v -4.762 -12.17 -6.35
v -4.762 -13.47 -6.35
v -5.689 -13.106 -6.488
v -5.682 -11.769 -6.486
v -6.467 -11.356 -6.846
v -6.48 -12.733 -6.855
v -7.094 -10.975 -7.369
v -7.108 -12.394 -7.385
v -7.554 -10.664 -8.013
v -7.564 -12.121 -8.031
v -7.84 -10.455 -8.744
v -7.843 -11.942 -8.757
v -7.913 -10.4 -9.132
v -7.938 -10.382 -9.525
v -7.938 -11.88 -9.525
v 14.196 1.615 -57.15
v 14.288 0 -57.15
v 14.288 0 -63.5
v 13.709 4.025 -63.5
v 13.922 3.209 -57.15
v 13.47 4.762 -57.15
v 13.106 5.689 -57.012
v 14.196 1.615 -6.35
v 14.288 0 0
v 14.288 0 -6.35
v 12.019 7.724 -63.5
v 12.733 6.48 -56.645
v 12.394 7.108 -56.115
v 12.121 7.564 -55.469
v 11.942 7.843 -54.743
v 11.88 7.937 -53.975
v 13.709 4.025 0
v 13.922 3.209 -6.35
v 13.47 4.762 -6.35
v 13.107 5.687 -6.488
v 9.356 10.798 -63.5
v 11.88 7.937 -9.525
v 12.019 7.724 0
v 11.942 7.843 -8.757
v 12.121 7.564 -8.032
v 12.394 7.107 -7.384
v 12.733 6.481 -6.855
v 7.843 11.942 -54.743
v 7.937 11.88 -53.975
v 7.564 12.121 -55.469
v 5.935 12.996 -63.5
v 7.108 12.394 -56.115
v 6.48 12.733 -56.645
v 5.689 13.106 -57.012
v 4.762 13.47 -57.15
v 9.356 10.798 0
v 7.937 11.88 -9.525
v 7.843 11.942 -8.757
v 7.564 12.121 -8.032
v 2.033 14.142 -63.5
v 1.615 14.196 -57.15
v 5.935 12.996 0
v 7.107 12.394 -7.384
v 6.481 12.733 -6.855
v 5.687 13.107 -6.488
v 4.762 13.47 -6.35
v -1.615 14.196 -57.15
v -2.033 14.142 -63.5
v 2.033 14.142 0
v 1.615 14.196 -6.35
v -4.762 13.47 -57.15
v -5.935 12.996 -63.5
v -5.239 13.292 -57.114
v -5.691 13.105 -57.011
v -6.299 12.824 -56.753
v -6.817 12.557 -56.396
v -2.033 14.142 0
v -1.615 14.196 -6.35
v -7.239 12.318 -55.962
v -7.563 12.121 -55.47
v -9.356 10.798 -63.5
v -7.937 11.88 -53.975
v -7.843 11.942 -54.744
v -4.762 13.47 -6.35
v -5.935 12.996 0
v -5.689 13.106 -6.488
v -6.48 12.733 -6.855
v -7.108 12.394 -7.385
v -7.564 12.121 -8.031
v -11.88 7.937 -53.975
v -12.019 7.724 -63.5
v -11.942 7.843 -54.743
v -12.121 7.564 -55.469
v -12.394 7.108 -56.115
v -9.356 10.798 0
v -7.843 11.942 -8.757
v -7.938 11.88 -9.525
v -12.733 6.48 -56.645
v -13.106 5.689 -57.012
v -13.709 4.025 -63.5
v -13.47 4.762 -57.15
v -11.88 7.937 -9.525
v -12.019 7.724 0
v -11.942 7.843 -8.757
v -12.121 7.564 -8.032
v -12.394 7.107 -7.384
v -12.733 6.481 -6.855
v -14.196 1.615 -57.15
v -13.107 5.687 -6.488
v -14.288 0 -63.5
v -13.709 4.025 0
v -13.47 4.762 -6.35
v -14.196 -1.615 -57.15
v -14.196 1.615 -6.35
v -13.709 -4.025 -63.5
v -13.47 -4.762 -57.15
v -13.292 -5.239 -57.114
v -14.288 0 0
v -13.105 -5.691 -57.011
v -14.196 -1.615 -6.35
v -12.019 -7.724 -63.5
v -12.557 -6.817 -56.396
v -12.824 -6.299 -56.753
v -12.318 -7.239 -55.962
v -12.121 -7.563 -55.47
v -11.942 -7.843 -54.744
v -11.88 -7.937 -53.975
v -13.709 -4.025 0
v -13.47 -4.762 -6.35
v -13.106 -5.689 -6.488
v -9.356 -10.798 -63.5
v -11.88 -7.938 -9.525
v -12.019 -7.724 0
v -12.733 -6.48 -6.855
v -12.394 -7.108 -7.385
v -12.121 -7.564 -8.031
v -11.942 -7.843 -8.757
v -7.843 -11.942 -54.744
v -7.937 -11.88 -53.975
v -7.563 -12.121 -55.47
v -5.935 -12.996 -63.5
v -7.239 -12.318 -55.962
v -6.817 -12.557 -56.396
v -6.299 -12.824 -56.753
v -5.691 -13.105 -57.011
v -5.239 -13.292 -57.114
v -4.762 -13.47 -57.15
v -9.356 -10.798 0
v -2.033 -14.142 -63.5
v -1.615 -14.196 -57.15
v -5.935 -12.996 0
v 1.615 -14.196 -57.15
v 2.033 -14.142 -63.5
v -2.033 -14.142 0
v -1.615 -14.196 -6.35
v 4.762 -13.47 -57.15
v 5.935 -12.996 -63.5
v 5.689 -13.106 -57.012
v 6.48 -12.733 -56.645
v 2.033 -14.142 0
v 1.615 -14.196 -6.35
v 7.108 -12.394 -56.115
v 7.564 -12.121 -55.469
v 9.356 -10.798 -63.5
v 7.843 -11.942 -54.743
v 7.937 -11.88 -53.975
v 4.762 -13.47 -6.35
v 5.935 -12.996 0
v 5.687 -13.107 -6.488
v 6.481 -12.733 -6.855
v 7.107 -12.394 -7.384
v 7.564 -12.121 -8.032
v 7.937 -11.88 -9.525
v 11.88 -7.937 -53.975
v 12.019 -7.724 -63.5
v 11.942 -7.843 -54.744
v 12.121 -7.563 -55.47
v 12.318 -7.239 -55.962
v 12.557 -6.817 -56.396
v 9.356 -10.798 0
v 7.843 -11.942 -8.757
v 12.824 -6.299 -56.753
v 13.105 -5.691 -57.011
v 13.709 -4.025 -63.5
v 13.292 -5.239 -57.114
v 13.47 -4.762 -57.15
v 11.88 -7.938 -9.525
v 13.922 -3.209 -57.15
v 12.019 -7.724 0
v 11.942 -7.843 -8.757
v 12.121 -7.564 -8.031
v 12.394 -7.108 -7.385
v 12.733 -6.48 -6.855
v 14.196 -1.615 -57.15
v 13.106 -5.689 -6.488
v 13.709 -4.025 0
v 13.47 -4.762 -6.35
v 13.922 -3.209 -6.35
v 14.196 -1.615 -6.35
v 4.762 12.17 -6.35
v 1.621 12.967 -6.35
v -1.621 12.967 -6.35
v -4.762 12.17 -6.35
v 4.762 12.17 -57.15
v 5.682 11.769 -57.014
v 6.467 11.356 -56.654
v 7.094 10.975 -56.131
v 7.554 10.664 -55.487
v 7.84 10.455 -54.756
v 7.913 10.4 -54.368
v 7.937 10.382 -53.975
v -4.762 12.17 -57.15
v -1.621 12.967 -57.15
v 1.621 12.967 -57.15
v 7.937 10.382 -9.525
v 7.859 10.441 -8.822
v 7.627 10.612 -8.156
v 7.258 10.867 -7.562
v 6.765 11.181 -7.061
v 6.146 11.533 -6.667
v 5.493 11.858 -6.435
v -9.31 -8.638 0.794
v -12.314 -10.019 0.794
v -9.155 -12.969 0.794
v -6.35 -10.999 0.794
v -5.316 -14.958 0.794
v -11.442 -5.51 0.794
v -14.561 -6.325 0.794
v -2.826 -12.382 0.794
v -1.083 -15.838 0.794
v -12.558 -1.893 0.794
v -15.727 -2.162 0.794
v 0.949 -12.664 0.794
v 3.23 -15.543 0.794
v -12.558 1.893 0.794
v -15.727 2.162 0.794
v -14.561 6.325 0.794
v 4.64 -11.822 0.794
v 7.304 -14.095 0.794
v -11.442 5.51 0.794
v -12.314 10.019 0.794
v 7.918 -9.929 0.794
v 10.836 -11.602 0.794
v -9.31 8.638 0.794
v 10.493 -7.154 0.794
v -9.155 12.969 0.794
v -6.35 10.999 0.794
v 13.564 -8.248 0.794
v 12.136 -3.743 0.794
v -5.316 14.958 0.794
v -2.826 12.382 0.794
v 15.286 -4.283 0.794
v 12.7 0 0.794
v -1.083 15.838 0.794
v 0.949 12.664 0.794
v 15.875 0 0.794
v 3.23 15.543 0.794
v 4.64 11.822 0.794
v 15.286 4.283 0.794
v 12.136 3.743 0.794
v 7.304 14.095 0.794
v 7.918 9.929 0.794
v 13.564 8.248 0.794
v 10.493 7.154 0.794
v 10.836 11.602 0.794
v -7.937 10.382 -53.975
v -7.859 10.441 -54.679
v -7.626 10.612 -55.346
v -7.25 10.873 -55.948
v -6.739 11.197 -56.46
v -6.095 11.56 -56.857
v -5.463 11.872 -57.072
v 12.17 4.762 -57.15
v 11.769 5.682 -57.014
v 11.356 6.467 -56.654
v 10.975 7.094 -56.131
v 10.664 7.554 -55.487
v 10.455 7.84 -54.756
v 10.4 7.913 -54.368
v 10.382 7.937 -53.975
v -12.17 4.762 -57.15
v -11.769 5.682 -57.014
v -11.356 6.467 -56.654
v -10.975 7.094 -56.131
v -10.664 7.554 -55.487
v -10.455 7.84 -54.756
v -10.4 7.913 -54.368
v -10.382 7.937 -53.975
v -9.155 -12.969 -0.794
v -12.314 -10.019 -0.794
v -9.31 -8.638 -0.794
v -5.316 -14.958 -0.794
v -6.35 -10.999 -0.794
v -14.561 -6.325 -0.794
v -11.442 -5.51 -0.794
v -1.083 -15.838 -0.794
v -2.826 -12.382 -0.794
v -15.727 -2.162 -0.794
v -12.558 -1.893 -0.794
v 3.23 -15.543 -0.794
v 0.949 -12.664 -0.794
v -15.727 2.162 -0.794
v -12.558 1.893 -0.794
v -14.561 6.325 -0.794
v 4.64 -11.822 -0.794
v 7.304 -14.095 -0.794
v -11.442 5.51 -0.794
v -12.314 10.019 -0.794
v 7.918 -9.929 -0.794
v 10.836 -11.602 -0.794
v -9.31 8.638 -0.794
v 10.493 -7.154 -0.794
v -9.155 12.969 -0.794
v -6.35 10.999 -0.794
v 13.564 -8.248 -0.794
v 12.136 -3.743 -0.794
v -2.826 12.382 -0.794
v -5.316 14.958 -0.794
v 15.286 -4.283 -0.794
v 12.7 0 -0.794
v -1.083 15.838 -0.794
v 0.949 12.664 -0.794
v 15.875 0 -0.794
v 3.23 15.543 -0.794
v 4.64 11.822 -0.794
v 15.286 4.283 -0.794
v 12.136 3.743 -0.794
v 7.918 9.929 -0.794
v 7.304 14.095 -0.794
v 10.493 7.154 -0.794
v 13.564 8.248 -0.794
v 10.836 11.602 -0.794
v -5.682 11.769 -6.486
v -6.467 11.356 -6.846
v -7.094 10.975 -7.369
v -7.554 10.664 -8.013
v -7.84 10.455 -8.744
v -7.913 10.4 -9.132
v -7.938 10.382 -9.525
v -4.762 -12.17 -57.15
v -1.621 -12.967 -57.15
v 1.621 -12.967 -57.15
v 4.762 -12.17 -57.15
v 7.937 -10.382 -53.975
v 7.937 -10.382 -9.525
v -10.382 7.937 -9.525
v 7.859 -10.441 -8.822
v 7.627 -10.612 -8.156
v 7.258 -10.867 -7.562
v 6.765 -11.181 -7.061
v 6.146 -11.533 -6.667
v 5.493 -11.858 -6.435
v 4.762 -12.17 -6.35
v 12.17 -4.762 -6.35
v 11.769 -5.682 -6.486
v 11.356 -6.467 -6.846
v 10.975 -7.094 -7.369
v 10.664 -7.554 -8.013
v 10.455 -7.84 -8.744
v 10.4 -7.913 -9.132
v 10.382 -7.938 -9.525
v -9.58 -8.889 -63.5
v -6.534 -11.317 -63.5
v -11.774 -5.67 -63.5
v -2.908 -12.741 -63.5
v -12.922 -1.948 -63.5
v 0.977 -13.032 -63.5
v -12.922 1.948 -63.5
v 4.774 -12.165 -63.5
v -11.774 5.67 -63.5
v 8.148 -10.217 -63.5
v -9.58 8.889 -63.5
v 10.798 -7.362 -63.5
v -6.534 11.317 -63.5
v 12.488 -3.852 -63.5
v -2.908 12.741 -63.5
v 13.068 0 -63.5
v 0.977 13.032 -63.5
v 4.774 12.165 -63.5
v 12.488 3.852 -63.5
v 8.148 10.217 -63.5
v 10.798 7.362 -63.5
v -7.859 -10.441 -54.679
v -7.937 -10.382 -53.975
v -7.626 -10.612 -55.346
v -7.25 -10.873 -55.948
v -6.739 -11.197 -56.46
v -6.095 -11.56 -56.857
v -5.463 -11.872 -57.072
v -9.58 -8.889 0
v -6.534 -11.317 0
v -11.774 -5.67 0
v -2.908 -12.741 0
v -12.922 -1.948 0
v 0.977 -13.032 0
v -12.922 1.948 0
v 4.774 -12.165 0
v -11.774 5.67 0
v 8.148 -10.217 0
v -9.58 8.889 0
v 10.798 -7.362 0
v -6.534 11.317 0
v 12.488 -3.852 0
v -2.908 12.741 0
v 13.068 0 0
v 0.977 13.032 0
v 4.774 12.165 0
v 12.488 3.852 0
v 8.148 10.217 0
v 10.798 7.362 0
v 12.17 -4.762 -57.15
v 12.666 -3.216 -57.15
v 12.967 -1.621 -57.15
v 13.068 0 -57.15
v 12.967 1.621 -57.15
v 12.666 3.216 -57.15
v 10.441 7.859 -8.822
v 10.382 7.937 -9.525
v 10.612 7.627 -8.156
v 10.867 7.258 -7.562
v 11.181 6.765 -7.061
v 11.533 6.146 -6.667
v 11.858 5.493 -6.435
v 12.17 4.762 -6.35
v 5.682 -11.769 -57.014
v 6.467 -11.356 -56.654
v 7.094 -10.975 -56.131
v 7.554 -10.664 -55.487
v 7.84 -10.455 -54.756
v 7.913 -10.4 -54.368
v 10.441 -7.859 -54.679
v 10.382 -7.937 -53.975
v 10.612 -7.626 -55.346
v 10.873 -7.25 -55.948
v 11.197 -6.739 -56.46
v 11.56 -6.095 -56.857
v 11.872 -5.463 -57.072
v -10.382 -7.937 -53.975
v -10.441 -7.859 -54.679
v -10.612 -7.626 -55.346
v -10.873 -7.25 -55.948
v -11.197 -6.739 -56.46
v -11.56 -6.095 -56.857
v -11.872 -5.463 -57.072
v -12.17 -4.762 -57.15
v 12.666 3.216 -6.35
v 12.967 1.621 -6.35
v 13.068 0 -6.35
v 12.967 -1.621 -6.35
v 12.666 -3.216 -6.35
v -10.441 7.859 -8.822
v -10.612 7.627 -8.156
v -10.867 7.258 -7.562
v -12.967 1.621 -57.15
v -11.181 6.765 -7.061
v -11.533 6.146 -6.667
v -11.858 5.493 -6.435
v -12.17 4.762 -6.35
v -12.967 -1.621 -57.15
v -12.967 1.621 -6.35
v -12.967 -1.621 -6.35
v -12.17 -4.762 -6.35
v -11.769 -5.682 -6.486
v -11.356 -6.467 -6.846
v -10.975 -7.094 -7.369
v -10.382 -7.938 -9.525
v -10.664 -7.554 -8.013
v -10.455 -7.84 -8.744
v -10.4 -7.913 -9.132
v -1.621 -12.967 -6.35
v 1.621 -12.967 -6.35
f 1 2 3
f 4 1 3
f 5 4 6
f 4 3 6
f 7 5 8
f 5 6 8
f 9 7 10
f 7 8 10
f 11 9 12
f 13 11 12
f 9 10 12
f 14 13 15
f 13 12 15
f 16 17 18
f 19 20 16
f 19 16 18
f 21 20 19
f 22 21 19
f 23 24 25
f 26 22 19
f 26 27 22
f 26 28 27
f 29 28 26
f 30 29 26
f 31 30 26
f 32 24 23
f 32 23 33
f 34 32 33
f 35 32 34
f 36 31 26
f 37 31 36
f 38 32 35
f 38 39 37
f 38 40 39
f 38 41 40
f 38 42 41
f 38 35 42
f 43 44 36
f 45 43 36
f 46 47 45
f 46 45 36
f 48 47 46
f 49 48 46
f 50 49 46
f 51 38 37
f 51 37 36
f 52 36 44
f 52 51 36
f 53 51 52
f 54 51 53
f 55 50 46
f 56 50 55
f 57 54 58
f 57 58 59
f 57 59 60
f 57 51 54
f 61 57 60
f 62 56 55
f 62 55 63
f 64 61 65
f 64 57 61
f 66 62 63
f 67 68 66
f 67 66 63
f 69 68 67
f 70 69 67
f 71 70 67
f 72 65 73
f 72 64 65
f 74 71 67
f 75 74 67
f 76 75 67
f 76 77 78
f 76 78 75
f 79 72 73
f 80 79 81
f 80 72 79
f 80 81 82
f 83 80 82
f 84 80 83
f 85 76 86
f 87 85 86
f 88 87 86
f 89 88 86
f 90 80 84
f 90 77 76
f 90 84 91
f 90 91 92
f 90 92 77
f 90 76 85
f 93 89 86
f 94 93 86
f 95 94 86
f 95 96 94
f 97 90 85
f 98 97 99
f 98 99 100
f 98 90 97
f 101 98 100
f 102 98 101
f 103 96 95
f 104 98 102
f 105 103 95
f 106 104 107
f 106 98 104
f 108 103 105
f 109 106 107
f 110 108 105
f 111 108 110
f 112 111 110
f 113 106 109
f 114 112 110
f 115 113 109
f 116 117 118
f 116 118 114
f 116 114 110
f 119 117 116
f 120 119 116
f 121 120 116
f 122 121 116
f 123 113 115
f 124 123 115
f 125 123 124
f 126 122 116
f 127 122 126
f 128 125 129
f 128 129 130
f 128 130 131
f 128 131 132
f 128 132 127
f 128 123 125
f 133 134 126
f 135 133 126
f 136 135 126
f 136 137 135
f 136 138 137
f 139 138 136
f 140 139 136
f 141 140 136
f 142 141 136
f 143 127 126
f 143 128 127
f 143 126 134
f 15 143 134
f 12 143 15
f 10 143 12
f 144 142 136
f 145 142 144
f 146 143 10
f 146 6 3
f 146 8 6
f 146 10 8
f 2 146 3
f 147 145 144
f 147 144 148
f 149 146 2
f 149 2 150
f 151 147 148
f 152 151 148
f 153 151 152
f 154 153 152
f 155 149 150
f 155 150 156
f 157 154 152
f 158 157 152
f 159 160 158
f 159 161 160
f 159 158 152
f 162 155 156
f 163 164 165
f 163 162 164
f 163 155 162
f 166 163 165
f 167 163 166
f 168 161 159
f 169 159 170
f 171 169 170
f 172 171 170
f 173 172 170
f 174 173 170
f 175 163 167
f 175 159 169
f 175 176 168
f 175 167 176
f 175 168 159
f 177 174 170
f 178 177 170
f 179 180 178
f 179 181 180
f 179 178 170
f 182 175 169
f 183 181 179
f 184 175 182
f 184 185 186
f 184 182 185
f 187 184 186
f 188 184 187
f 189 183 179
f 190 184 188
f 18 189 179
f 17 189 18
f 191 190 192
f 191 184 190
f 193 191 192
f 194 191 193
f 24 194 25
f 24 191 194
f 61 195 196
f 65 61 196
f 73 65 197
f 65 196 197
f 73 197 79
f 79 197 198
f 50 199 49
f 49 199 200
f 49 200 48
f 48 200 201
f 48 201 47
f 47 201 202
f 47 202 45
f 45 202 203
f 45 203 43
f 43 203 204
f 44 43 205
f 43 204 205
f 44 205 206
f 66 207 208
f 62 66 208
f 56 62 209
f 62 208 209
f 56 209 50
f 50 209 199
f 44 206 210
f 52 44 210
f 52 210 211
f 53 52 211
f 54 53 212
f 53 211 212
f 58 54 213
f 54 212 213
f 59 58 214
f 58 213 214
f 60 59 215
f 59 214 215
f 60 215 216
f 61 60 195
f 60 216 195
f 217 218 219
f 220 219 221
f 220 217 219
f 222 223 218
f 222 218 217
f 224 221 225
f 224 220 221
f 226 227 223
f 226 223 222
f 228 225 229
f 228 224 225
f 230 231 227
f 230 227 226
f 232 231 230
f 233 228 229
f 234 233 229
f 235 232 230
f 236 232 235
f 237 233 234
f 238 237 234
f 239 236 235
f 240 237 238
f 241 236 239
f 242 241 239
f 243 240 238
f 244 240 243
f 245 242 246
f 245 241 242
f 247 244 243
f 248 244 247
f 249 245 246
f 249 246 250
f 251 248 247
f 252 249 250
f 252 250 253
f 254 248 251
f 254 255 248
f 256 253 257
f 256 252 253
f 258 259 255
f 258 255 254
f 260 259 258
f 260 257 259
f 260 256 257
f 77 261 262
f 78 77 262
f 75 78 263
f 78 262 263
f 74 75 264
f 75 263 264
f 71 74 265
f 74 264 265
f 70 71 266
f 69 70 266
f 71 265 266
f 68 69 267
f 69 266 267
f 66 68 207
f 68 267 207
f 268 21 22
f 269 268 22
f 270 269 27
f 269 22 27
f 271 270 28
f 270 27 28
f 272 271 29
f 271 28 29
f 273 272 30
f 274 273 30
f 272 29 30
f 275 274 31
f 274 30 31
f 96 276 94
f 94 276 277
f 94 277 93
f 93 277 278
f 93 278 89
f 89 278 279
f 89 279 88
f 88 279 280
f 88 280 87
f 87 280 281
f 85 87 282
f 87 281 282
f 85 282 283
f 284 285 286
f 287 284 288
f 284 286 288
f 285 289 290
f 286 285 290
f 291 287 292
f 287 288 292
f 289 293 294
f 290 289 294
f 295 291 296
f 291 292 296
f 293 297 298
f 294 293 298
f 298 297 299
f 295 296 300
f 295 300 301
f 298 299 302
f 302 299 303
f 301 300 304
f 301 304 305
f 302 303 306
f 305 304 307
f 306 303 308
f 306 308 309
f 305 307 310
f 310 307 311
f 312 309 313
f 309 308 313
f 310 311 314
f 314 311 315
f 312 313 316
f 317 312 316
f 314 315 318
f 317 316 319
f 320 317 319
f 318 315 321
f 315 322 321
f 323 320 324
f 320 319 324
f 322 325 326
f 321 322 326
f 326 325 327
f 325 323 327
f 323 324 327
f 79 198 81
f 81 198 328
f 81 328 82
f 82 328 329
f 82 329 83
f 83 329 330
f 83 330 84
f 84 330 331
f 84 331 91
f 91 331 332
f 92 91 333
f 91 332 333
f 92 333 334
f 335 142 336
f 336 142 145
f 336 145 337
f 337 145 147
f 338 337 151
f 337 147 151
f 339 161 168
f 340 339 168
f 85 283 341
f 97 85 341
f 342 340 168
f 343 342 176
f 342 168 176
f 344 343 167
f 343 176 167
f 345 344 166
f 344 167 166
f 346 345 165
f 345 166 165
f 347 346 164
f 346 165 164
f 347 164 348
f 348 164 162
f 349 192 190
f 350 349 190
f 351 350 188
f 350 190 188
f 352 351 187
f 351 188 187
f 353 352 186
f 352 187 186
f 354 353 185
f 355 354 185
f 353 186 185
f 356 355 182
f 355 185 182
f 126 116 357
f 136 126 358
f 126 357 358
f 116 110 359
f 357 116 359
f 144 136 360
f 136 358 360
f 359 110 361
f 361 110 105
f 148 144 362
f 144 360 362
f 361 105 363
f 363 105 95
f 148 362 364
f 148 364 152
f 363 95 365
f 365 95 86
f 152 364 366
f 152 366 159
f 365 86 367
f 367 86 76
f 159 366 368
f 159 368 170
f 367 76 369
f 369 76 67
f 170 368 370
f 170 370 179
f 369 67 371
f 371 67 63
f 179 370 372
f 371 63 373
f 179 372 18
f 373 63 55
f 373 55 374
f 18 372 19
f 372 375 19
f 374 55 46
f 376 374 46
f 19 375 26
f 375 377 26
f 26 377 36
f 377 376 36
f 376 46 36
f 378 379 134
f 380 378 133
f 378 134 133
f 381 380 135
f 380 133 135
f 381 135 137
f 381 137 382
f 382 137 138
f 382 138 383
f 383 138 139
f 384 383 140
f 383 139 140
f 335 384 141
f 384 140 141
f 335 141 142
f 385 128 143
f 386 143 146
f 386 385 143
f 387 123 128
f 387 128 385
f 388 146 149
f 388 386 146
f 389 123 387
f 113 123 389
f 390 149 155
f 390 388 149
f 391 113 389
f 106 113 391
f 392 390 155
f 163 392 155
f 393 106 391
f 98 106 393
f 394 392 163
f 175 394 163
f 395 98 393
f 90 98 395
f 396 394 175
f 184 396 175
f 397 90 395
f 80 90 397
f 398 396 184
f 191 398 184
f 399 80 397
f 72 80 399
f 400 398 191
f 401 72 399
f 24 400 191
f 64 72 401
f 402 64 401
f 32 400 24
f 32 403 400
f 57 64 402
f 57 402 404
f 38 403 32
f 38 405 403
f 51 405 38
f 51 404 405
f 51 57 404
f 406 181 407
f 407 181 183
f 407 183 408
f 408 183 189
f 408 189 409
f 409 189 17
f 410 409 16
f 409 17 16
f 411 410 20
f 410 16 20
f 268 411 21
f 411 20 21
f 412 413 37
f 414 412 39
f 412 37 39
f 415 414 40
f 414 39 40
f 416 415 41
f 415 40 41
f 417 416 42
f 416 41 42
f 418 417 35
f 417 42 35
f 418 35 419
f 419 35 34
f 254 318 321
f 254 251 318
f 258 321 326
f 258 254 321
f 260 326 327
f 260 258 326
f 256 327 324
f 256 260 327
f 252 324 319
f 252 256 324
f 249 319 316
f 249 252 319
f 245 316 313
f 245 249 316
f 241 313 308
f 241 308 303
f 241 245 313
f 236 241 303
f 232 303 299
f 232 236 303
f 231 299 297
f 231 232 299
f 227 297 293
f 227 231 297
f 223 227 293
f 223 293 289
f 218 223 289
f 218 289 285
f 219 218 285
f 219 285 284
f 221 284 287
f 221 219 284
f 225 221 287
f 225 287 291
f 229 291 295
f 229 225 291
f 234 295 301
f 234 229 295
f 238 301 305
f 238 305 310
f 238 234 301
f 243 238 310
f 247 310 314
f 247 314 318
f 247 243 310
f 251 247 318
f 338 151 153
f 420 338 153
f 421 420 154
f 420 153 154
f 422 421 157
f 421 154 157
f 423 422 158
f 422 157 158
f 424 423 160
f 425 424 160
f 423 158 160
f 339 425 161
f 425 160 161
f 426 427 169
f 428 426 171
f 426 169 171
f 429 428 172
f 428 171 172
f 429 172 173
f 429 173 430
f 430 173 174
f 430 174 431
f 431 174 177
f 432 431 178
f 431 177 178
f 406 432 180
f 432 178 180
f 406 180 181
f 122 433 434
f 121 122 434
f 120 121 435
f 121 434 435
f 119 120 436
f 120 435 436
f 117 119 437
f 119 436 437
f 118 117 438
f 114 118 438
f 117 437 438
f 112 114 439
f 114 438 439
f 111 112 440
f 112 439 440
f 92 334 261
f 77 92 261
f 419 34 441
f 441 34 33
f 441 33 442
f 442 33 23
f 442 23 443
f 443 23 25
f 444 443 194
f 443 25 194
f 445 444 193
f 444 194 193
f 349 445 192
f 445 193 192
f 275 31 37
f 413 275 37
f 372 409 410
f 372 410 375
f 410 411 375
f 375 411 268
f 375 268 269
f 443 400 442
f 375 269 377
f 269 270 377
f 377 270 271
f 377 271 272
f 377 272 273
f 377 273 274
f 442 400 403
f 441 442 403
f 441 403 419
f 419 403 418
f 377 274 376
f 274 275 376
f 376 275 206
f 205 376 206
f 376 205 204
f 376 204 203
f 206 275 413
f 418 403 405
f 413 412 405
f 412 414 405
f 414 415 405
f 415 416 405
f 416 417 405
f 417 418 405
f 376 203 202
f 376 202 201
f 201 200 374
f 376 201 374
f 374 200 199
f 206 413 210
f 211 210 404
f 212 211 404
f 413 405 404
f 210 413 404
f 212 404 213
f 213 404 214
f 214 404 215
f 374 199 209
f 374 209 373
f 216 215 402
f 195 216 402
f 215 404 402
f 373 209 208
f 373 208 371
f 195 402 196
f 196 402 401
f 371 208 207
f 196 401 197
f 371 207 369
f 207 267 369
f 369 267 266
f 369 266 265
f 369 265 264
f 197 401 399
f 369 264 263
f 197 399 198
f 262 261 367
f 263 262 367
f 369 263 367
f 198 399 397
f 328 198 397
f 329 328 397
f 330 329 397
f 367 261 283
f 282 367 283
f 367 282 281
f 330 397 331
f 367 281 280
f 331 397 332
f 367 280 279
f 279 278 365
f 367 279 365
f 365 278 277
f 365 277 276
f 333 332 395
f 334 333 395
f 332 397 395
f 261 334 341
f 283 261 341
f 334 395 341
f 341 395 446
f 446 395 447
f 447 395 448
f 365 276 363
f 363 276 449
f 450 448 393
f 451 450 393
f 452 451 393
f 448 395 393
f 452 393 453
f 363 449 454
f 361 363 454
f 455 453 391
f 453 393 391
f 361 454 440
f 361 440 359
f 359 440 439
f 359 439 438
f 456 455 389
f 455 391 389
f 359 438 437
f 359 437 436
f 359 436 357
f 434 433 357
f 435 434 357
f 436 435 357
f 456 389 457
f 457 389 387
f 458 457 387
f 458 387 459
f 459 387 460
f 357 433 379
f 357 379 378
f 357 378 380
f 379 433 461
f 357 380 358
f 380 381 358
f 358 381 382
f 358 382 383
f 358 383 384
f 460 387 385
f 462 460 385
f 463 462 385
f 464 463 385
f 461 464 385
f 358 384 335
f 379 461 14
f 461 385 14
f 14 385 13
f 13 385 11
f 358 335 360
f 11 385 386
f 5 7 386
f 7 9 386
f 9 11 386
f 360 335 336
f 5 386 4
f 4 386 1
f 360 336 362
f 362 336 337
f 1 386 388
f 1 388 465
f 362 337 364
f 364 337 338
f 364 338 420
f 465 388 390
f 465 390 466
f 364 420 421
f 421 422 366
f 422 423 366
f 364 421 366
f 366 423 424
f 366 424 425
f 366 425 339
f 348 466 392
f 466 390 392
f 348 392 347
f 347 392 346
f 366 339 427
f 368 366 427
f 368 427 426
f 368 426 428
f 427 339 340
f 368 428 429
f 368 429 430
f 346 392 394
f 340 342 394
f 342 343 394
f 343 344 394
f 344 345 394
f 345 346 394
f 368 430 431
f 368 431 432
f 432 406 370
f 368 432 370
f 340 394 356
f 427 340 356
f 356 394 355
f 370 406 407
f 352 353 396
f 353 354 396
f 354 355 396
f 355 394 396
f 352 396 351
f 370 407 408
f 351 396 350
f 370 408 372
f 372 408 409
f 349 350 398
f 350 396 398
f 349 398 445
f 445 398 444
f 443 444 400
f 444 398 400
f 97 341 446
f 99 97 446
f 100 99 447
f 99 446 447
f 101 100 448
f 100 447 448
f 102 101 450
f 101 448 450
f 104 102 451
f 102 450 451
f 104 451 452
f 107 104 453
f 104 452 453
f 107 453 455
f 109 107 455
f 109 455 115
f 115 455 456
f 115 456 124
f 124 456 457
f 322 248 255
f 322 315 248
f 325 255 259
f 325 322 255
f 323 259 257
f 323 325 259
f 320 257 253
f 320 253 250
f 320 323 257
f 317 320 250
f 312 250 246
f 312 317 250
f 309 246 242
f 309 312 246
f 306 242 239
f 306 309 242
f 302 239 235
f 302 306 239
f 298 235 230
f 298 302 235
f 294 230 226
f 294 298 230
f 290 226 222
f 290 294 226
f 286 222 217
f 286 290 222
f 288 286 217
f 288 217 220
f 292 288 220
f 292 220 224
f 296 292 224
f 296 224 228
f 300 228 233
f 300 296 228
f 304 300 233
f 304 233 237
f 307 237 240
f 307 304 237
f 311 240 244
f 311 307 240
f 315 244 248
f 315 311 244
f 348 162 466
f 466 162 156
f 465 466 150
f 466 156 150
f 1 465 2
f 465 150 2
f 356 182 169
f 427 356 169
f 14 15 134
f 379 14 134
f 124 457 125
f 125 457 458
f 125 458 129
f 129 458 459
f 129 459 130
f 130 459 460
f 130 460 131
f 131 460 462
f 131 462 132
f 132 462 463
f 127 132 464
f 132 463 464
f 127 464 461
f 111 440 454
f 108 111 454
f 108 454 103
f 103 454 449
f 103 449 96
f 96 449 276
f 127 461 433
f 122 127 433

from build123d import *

# Parameters (mm, degrees)
F0_R     = 15.875
F0_R_2   = 14.2875
F0_R_3   = 13.0683
F0_R_4   = 12.7
F1_DEPTH = 0.79375
F2_DEPTH = 63.5
F4_DEPTH = 15.875
F6_DEPTH = 15.875


with BuildPart() as f1:
    # F0 (on Top) → F1 (new body, symmetric)
    with BuildSketch(Plane.XY):
        Circle(F0_R)
        Circle(F0_R_2, mode=Mode.SUBTRACT)
        Circle(F0_R_2)
        Circle(F0_R_3, mode=Mode.SUBTRACT)
        Circle(F0_R_3)
        Circle(F0_R_4, mode=Mode.SUBTRACT)
    extrude(amount=F1_DEPTH, both=True)


with BuildPart() as f2:
    # F0 (on Top) → F2 (new body)
    with BuildSketch(Plane.XY):
        Circle(F0_R_2)
        Circle(F0_R_3, mode=Mode.SUBTRACT)
    extrude(amount=-F2_DEPTH)

    # F3 (on Right) → F4 (cut, symmetric)
    with BuildSketch(Plane.YZ):
        with BuildLine():
            Line((4.7625, -6.35), (-4.7625, -6.35))
            ThreePointArc((-4.7625, -6.35), (-7.0075640303, -7.2799359697), (-7.9375, -9.525))
            Line((-7.9375, -9.525), (-7.9375, -53.975))
            ThreePointArc((-7.9375, -53.975), (-7.0075640303, -56.2200640303), (-4.7625, -57.15))
            Line((-4.7625, -57.15), (4.7625, -57.15))
            ThreePointArc((4.7625, -57.15), (7.0075640303, -56.2200640303), (7.9375, -53.975))
            Line((7.9375, -53.975), (7.9375, -9.525))
            ThreePointArc((7.9375, -9.525), (7.0075640303, -7.2799359697), (4.7625, -6.35))
        make_face()
    extrude(amount=F4_DEPTH, both=True, mode=Mode.SUBTRACT)

    # F5 (on Front) → F6 (cut, symmetric)
    with BuildSketch(Plane.XZ):
        with BuildLine():
            ThreePointArc((7.9375, -9.525), (7.0075640303, -7.2799359697), (4.7625, -6.35))
            Line((4.7625, -6.35), (-4.7625, -6.35))
            ThreePointArc((-4.7625, -6.35), (-7.0075640303, -7.2799359697), (-7.9375, -9.525))
            Line((-7.9375, -9.525), (-7.9375, -53.975))
            ThreePointArc((-7.9375, -53.975), (-7.0075640303, -56.2200640303), (-4.7625, -57.15))
            Line((-4.7625, -57.15), (4.7625, -57.15))
            ThreePointArc((4.7625, -57.15), (7.0075640303, -56.2200640303), (7.9375, -53.975))
            Line((7.9375, -53.975), (7.9375, -9.525))
        make_face()
    extrude(amount=F6_DEPTH, both=True, mode=Mode.SUBTRACT)


solid = Compound([f1.part, f2.part])
